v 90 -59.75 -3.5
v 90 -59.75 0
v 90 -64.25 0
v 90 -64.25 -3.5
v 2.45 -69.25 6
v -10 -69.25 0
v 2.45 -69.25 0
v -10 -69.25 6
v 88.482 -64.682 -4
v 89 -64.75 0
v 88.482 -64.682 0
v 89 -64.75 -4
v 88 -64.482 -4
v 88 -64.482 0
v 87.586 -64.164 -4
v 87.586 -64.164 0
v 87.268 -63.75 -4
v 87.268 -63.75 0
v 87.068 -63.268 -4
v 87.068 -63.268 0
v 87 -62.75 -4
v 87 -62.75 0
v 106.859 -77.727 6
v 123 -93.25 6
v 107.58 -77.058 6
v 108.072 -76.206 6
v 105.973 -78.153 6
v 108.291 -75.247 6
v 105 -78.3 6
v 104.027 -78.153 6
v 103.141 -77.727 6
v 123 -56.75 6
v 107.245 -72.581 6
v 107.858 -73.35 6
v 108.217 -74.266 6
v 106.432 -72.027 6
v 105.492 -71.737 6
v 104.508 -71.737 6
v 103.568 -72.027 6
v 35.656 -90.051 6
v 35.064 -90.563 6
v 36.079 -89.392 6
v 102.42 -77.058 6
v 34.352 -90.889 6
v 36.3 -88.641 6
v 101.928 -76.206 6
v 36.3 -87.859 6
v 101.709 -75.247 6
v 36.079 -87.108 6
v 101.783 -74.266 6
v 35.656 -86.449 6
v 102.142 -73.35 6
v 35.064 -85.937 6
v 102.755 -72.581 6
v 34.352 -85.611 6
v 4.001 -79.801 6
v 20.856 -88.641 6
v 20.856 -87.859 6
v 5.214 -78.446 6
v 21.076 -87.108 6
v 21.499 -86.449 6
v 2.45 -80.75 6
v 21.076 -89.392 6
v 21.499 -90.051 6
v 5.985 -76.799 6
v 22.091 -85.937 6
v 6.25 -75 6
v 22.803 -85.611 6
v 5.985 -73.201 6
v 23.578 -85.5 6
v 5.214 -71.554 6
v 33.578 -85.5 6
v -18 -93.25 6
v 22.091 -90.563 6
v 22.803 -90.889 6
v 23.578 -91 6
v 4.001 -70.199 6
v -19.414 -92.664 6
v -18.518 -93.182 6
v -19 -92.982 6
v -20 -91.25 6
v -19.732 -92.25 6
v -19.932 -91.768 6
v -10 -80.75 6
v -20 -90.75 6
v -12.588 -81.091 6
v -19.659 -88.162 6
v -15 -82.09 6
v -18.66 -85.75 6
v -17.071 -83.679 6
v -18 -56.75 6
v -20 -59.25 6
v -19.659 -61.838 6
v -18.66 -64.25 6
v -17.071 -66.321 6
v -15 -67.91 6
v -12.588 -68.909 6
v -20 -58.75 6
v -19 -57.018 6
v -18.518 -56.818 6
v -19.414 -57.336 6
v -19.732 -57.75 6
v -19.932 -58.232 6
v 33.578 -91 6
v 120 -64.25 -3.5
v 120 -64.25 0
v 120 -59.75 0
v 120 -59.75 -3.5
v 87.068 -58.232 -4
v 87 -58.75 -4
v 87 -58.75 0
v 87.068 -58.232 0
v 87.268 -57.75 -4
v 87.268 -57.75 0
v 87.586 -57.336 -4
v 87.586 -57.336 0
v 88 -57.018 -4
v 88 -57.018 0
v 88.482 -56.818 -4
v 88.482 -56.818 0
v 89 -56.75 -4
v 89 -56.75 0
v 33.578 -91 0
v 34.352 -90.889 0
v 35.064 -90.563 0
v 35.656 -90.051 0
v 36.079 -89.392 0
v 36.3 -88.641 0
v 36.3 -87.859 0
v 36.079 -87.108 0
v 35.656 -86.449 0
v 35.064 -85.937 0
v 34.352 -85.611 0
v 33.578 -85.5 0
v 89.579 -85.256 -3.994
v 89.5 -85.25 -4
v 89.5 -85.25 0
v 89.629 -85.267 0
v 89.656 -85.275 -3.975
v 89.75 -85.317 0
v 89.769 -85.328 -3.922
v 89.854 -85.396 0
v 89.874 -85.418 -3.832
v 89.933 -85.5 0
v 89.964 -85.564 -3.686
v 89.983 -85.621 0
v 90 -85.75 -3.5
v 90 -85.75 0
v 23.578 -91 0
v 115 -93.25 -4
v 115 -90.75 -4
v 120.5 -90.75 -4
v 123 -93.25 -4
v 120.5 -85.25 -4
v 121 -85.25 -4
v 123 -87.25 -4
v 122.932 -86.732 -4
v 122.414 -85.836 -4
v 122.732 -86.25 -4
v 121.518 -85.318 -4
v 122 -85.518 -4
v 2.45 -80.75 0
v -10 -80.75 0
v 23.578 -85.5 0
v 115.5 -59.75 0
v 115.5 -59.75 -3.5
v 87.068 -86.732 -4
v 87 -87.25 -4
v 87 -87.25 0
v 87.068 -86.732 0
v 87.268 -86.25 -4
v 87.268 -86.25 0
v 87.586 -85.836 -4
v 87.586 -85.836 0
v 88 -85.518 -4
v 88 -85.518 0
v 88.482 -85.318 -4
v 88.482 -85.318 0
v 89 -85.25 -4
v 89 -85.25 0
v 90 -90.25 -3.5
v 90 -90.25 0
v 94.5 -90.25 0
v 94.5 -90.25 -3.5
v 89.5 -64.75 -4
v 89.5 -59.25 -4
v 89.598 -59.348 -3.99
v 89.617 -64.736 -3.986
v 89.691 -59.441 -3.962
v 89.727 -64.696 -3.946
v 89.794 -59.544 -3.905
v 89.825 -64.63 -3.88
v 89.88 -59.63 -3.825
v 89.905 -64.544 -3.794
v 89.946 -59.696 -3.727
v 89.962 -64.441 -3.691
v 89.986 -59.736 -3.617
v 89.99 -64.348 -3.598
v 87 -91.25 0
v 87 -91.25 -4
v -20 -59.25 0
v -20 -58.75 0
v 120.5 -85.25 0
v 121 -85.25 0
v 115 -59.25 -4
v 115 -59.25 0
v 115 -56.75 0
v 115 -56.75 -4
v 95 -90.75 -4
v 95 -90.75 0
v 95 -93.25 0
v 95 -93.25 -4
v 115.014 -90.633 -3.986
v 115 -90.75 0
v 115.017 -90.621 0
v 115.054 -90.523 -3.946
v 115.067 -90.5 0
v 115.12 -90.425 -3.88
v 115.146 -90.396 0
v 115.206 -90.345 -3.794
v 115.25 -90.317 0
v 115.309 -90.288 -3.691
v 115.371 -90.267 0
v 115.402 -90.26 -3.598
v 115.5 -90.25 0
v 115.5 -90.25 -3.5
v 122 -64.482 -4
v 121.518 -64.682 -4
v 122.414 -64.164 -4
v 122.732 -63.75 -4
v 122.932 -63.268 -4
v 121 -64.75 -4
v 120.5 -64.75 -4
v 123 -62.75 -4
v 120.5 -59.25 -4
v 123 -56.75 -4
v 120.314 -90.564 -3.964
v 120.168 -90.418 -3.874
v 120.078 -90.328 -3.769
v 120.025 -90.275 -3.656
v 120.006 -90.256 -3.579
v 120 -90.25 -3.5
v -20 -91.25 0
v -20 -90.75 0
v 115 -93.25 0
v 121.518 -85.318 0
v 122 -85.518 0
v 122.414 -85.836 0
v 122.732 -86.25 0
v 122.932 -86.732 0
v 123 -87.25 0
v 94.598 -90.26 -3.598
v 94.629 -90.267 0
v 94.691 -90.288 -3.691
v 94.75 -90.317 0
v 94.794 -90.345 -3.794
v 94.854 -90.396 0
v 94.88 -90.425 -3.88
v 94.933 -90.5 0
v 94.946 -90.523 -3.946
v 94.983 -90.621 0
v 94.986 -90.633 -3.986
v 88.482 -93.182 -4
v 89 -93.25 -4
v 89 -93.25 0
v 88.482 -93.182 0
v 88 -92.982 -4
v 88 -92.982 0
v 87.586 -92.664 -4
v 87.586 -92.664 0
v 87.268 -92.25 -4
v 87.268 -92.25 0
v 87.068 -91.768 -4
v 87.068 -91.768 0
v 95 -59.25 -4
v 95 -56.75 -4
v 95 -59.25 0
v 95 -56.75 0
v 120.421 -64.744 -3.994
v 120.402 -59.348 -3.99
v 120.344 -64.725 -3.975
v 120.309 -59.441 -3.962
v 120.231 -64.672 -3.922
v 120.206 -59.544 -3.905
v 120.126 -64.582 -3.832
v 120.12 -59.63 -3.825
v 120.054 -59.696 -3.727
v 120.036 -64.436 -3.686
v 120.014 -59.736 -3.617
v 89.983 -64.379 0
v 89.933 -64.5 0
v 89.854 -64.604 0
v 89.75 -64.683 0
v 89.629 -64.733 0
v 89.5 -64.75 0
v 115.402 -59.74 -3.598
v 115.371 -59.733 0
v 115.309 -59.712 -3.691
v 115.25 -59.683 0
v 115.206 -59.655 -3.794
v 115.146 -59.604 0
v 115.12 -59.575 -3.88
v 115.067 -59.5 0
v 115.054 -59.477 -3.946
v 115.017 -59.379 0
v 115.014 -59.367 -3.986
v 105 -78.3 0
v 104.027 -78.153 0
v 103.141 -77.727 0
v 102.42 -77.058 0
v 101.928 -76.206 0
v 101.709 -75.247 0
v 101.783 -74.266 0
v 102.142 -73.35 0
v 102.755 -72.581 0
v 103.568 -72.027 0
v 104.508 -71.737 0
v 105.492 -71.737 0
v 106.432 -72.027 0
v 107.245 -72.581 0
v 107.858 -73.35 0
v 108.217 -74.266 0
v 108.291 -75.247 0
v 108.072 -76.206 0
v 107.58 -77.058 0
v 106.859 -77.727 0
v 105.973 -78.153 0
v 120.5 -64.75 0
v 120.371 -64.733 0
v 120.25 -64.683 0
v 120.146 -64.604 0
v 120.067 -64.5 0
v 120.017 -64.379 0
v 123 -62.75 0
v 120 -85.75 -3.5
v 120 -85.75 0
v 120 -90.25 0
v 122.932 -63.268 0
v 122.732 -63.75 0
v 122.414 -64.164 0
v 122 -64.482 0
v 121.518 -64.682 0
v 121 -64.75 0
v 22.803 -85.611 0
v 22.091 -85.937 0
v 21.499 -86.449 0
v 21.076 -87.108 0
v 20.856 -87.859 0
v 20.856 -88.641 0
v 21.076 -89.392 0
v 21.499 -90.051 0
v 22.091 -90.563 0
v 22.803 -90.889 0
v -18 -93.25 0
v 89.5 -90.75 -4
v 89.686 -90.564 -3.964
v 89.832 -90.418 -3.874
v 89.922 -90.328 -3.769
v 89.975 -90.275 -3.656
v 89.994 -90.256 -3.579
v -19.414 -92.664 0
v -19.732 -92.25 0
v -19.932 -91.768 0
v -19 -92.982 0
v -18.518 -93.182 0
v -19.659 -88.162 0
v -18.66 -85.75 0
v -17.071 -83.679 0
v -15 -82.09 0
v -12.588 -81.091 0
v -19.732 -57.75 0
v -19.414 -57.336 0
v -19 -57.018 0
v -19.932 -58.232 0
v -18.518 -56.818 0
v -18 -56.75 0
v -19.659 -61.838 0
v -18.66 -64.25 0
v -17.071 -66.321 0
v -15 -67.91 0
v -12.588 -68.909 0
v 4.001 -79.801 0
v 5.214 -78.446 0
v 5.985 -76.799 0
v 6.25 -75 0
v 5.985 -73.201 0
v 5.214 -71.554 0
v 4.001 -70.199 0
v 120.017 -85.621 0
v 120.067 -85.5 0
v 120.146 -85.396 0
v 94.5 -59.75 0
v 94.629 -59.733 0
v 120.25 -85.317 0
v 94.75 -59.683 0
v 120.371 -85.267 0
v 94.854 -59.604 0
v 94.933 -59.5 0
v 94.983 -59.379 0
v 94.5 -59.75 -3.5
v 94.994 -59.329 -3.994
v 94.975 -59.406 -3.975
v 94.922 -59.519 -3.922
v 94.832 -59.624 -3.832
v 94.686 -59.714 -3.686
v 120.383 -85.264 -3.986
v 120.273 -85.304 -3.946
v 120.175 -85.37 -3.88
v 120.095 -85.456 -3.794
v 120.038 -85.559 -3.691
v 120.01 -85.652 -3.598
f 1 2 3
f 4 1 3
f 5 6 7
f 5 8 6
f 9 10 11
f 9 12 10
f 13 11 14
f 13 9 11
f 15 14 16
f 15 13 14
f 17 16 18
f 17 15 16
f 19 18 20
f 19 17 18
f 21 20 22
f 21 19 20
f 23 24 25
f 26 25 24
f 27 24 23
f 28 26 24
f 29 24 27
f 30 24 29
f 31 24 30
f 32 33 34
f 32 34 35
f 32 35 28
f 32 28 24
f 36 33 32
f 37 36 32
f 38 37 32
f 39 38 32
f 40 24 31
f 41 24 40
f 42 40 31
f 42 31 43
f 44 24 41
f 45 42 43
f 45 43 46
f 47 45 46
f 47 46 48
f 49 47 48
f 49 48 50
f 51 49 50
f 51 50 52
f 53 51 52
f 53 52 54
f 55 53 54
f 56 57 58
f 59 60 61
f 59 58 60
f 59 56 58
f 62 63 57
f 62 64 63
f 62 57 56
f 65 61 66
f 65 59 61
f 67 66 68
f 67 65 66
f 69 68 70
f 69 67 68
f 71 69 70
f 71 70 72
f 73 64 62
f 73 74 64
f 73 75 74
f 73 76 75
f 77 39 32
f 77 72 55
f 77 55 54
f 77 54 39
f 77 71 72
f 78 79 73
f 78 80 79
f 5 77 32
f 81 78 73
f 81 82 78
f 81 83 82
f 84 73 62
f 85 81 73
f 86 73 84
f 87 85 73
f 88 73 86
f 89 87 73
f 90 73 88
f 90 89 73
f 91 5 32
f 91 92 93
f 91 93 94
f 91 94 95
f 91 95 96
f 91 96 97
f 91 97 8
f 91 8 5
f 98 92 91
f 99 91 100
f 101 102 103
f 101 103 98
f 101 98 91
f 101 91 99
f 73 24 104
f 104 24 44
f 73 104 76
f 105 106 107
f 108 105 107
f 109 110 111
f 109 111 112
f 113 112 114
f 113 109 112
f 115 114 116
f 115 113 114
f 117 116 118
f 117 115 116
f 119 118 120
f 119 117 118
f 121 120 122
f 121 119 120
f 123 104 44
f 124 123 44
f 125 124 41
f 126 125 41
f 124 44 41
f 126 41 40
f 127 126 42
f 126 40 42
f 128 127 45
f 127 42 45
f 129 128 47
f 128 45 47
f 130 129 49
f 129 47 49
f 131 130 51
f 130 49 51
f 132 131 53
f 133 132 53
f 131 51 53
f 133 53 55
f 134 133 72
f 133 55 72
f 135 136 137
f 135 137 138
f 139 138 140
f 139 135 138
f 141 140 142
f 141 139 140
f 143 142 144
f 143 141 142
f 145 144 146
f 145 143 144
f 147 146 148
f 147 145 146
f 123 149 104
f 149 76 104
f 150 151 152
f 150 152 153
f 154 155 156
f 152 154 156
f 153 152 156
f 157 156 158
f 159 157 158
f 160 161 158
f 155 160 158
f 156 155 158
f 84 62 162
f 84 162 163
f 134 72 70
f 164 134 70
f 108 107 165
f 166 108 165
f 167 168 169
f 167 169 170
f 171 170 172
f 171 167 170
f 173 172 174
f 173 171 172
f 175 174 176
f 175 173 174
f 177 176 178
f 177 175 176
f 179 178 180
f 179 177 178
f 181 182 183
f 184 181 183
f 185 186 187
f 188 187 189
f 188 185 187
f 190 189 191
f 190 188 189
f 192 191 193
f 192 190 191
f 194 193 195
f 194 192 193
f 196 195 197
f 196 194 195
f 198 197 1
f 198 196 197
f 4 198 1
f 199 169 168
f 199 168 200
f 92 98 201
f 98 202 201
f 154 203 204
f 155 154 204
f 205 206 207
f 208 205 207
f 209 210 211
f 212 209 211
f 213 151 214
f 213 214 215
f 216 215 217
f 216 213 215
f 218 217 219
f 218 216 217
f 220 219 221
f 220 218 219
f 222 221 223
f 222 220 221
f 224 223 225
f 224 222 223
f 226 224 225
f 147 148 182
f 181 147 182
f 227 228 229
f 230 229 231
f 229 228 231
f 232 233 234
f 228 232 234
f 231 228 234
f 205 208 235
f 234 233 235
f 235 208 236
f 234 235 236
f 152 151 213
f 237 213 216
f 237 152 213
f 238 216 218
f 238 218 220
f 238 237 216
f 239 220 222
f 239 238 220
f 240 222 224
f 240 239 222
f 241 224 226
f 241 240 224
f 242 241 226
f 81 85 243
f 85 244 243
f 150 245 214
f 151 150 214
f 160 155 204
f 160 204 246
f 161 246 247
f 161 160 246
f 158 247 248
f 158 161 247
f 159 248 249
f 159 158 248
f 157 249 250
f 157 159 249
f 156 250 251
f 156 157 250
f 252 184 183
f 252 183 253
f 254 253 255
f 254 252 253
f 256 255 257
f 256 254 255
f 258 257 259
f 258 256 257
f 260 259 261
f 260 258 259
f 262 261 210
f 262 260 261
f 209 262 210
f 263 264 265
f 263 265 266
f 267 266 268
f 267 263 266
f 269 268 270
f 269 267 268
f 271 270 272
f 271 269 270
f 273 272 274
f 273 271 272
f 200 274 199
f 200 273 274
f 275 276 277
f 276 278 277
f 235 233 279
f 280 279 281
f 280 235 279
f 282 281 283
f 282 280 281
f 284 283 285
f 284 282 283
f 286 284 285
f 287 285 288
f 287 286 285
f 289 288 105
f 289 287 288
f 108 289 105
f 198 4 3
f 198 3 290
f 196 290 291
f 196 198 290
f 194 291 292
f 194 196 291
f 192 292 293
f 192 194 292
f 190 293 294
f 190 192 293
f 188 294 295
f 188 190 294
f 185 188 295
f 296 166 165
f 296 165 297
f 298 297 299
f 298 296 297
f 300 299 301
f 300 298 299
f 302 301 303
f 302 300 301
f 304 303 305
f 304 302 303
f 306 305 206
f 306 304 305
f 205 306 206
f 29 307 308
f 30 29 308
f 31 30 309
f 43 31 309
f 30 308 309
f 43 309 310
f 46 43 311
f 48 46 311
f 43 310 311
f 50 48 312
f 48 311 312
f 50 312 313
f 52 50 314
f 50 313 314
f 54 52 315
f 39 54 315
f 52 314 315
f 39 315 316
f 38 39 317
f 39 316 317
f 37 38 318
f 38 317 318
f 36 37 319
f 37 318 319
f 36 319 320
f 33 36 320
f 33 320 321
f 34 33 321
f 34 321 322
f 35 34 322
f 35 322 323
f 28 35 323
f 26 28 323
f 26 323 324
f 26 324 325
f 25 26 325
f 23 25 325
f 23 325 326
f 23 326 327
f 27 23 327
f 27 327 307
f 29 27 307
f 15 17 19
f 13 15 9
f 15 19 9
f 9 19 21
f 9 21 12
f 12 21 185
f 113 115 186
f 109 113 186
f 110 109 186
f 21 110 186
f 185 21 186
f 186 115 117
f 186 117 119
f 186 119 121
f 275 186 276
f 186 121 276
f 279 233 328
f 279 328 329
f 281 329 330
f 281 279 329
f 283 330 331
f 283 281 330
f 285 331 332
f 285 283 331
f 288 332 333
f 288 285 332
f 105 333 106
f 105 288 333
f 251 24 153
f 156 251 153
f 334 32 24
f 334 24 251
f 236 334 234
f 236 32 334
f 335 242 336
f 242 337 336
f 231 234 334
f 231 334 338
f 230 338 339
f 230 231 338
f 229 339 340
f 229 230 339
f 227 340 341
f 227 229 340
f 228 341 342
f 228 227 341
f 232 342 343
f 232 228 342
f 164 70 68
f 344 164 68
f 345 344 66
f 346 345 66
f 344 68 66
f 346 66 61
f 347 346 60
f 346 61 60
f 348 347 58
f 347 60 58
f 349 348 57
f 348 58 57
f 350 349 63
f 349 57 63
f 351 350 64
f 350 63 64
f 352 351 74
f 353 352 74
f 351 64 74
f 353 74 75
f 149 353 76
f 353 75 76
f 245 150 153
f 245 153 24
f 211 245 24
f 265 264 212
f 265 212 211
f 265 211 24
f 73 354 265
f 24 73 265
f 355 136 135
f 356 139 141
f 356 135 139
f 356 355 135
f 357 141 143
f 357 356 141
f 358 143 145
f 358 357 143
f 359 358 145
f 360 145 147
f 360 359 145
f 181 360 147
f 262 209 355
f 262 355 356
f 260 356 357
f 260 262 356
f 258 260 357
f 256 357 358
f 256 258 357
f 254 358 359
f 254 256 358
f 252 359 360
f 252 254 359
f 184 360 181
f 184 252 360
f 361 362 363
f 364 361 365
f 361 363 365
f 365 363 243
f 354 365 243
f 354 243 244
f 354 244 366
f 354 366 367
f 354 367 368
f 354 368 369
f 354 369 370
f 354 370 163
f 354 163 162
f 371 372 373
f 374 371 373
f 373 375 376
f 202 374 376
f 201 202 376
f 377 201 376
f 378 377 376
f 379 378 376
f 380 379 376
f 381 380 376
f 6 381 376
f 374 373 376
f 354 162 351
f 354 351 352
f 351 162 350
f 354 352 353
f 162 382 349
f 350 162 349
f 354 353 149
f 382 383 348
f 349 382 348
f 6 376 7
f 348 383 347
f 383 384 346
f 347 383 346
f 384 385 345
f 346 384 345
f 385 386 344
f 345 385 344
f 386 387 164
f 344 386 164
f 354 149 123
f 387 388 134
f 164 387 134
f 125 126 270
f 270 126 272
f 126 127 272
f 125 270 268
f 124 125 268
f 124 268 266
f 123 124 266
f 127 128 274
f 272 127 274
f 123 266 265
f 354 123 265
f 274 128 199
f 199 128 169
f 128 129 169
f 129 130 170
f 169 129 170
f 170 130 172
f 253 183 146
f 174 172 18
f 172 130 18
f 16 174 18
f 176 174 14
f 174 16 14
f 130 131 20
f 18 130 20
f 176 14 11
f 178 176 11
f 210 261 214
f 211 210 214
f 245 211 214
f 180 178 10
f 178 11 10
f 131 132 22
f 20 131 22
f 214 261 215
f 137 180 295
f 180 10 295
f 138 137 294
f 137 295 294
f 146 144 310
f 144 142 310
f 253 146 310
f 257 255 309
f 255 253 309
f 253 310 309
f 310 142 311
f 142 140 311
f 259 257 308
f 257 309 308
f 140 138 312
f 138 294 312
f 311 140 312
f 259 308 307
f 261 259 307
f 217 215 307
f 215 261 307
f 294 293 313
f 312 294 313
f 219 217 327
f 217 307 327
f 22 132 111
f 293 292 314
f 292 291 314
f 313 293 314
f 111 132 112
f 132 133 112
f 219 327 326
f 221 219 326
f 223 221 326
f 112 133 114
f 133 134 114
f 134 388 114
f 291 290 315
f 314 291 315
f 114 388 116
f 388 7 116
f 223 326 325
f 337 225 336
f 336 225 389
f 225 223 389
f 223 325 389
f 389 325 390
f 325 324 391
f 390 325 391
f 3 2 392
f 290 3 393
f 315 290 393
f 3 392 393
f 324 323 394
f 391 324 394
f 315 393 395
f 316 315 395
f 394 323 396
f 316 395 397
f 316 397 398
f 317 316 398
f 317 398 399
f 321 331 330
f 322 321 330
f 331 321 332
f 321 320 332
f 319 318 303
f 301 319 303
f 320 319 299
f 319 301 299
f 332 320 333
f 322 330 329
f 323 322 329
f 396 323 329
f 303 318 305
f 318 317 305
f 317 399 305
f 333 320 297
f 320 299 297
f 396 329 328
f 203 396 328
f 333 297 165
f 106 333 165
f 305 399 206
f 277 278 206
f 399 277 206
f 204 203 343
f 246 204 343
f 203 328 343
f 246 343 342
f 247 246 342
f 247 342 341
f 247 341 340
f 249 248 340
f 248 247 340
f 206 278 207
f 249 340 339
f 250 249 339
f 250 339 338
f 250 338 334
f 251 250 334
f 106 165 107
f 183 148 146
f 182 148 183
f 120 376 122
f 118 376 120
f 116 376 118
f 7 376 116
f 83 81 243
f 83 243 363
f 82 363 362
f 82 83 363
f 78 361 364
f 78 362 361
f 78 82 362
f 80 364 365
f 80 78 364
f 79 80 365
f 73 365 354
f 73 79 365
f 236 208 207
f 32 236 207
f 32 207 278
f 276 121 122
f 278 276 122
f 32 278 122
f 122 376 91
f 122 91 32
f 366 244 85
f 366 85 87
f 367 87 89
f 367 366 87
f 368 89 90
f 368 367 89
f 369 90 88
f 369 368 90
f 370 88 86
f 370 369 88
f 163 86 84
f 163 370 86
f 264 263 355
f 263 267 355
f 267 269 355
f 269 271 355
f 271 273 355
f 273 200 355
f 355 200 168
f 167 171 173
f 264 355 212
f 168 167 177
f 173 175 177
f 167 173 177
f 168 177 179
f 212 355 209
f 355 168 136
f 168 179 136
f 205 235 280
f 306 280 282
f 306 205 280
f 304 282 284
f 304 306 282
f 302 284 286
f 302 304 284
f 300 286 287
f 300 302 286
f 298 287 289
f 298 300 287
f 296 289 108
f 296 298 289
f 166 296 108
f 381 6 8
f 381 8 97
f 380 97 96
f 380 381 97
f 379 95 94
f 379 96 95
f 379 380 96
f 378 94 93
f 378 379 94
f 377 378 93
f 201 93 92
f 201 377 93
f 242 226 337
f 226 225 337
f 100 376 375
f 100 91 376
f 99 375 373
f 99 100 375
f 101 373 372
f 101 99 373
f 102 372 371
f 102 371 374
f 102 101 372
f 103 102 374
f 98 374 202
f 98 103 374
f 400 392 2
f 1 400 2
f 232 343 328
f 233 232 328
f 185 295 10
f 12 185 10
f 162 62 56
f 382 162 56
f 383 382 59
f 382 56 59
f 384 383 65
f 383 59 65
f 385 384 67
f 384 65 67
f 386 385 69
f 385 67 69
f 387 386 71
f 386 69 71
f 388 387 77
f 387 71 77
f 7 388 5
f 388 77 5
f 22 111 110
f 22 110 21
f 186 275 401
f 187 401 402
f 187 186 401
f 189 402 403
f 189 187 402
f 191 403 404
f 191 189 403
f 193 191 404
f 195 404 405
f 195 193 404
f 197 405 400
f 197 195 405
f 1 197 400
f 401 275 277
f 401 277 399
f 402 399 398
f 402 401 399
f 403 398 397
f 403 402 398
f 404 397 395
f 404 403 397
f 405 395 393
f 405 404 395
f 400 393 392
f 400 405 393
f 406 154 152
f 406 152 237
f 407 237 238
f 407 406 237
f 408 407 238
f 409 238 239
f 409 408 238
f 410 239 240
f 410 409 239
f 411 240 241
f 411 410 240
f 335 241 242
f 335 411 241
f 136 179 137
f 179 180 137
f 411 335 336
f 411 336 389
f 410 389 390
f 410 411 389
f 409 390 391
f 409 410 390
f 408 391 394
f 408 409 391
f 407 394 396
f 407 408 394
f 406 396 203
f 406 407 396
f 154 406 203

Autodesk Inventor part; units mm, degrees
ref_plane "YZ Plane" through (0, 0, 0) normal (1, 0, 0) x (0, 1, 0)
ref_plane "XZ Plane" through (0, 0, 0) normal (0, 1, 0) x (-1, 0, 0)
ref_plane "作業平面1" through (0, 0, 0) normal (0, 0, 1) x (1, 0, 0)
sketch "スケッチ2" plane through (0, 0, 0) normal (0, 0, 1) x (1, 0, 0)
  line L0 (120, -56.75) -> (-20, -56.75)
  line L1 (-20, -56.75) -> (-20, -93.25)
  line L2 (-20, -93.25) -> (120, -93.25)
  line L3 (120, -93.25) -> (120, -56.75)
  circle A0 centre (0, -75) radius 6 construction
  circle A1 centre (0, -75) radius 75 construction
  point P0 (0, 0)
  dimension "d1" = 150
  dimension "d2" = 18.25
  dimension "d3" = 18.25
  dimension "d4" = 20
  dimension "d29" = 120
extrude "押し出し1" add sketch "スケッチ2" along normal blind 6
sketch "スケッチ3" plane through (0, 0, 6) normal (0, 0, 1) x (1, 0, 0)
  circle A0 centre (0, -75) radius 6 construction
  circle A1 centre (0, -75) radius 6.25
  line L0 (0, -68.75) -> (-38.1, -68.75) construction
  line L1 (-38.1, -68.75) -> (-38.1, -81.25) construction
  line L2 (-38.1, -81.25) -> (0, -81.25) construction
  line L3 (0, -81.25) -> (0, -68.75) construction
  line L4 (-20, -68) -> (-20, -81.25)
  line L5 (0, -82) -> (0, -68.75)
  line L6 (-20, -56.75) -> (-20, -93.25) projected
  line L7 (-20, -69.25) -> (2.4495, -69.25)
  line L8 (2.4495, -69.25) -> (2.4495, -80.75)
  line L9 (2.4495, -80.75) -> (-20, -80.75)
  line L10 (-20, -80.75) -> (-20, -69.25)
  point P0 (0, 0)
  point P1 (-2.4495, -80.75)
  point P2 (-2.4495, -69.25)
  point P3 (0, -80.75)
  point P4 (0, -69.25)
  point P5 (0, -81.25)
  dimension "d8" = 12.5
  dimension "d30" = 11.5
extrude "押し出し2" cut sketch "スケッチ3" against normal blind 12.5 contours A1 L8 | L8 L9 L5 L7 | L5 L9 A1 L7 | A1 L9 L4 L7
fillet "フィレット1" radius 10 2 edges at (-20, -80.75, 3) (-20, -69.25, 3)
ref_plane "作業平面2" through (-20, -75, 0) normal (0, -1, 0) x (1, 0, 0)
sketch "スケッチ4" plane through (0, 0, 6) normal (0, 0, 1) x (1, 0, 0)
  line L0 (-20, -93.25) -> (120, -93.25) projected
  line L1 (120, -56.75) -> (-20, -56.75) projected
  line L2 (120, -93.25) -> (120, -56.75) projected
  point P0 (0, 0)
  point P1 (105, -75)
  dimension "d25" = 15
  dimension "d26" = 36.5
  dimension "d27" = 18.25
hole "穴1" at (105, -75, 6) direction (0, 0, -1) diameter 6.6 end through all
ref_plane "作業平面3" through (0, -75, 0) normal (0, 0.7071, 0.7071) x (-1, 0, 0)
sketch "スケッチ5" plane through (0, 0, 0) normal (0, 0, 1) x (1, 0, 0)
  circle A0 centre (105, -75) radius 3.3 construction
  arc A1 (-20, -59.25) -> (-10, -69.25) centre (-10, -59.25) ccw construction
  line L0 (-10, -69.25) -> (2.4495, -69.25) construction
  arc A2 (2.4495, -80.75) -> (2.4495, -69.25) centre (0, -75) ccw construction
  line L1 (2.4495, -80.75) -> (-10, -80.75) construction
  arc A3 (-10, -80.75) -> (-20, -90.75) centre (-10, -90.75) ccw construction
  line L2 (-20, -90.75) -> (-20, -93.25) construction
  line L3 (-20, -93.25) -> (120, -93.25) construction
  line L4 (120, -93.25) -> (120, -56.75) construction
  line L5 (120, -56.75) -> (-20, -56.75) construction
  line L6 (-20, -56.75) -> (-20, -59.25) construction
  line L7 (123, -56.75) -> (87, -56.75)
  line L8 (87, -56.75) -> (87, -93.25)
  line L9 (87, -93.25) -> (123, -93.25)
  line L10 (123, -93.25) -> (123, -56.75)
  line L11 (120, -93.25) -> (120, -56.75) projected
  line L12 (90, -90.25) -> (120, -90.25)
  line L13 (120, -90.25) -> (120, -59.75)
  line L14 (120, -59.75) -> (90, -59.75)
  line L15 (90, -59.75) -> (90, -90.25)
  line L16 (90, -90.25) -> (120, -59.75) construction
  line L17 (120, -90.25) -> (90, -59.75) construction
  line L18 (87, -85.25) -> (123, -85.25)
  line L19 (123, -85.25) -> (123, -64.75)
  line L20 (123, -64.75) -> (87, -64.75)
  line L21 (87, -64.75) -> (87, -85.25)
  circle A4 centre (105, -75) radius 3.3 projected
  line L22 (87, -85.25) -> (123, -64.75) construction
  line L23 (123, -85.25) -> (87, -64.75) construction
  line L24 (95, -93.25) -> (115, -93.25)
  line L25 (115, -93.25) -> (115, -56.75)
  line L26 (115, -56.75) -> (95, -56.75)
  line L27 (95, -56.75) -> (95, -93.25)
  line L28 (95, -93.25) -> (115, -56.75) construction
  line L29 (115, -93.25) -> (95, -56.75) construction
  point P0 (0, 0)
  point P1 (95, -93.25)
  point P2 (95, -90.25)
  point P3 (90, -85.25)
  point P4 (95, -59.75)
  point P5 (90, -64.75)
  point P6 (120, -85.25)
  point P7 (115, -90.25)
  point P8 (115, -93.25)
  point P9 (115, -59.75)
  point P10 (120, -64.75)
  dimension "d31" = 3
  dimension "d34" = 30.5
  dimension "d35" = 3
  dimension "d36" = 3
  dimension "d37" = 3
  dimension "d38" = 8
  dimension "d39" = 8
extrude "押し出し3" add sketch "スケッチ5" against normal blind 4 contours L10 L20 L11 L7 | L11 L14 L25 L7 | L10 L9 L11 L18 | L27 L14 L15 L20 L8 L7 | L9 L25 L12 L11 | L18 L15 L12 L27 L9 L8
sketch "スケッチ6" plane through (120, -93.25, 0) normal (1, 0, 0) x (0, 0, -1)
  line L0 (0, 8) -> (0, 28.5) projected
  line L1 (0, 36.5) -> (-6, 36.5) projected
  line L2 (-6, 0) -> (-6, 36.5) projected
  line L3 (0, 0) -> (-6, 0) projected
  line L4 (0, 0) -> (0, 3) projected
  line L5 (0, 3) -> (0, 8) projected
  line L6 (0, 28.5) -> (0, 33.5) projected
  line L7 (0, 33.5) -> (0, 36.5) projected
  point P0 (0, 93.25)
extrude "押し出し4" add sketch "スケッチ6" along normal up to surface (3 mm away)
fillet "フィレット2" radius 2 8 edges at (-20, -56.75, 3) (-20, -93.25, 3) (87, -56.75, -2) (87, -93.25, -2) (87, -64.75, -2) (87, -85.25, -2) (123, -64.75, -2) (123, -85.25, -2)
fillet "フィレット2" radius 0.5 16 edges at (115, -59.75, -2) (120, -64.75, -2) (120, -85.25, -2) (115, -90.25, -2) (95, -59.75, -2) (90, -64.75, -2) (90, -62.25, -4) (92.5, -59.75, -4) (117.5, -59.75, -4) (120, -62.25, -4) (120, -87.75, -4) (117.5, -90.25, -4) (95, -90.25, -2) (90, -85.25, -2) (90, -87.75, -4) (92.5, -90.25, -4)
sketch "スケッチ7" plane through (20.6125, 13, 6) normal (0, 0, 1) x (1, 0, 0)
  arc A0 (3.9922, -80.75) -> (-0.2106, -72.4528) centre (-20.6125, -88) ccw
  circle A1 centre (-20.6125, -88) radius 31.5 construction
  circle A2 centre (7.9653, -101.25) radius 2.75 construction
  line L0 (-18, -106.25) -> (105, -106.25) construction
  arc A3 (-18.163, -93.75) -> (-18.163, -82.25) centre (-20.6125, -88) ccw projected
  line L1 (-38.6125, -106.25) -> (100.3875, -106.25) projected
  point P0 (0, 0)
  dimension "d48" = 63
  dimension "d46" = 5.5
  dimension "d47" = 5
hole "穴2" at (28.5777, -88.25, 6) direction (0, 0, -1) diameter 5.5 end through all
sketch "スケッチ8" plane through (0, 0, 6) normal (0, 0, 1) x (1, 0, 0)
  circle A0 centre (28.5777, -88.25) radius 2.75 construction
  arc A1 (121, -93.25) -> (123, -91.25) centre (121, -91.25) ccw construction
  line L0 (123, -91.25) -> (123, -58.75) construction
  arc A2 (123, -58.75) -> (121, -56.75) centre (121, -58.75) ccw construction
  line L1 (-18, -56.75) -> (121, -56.75) construction
  arc A3 (-18, -56.75) -> (-20, -58.75) centre (-18, -58.75) ccw construction
  line L2 (-20, -58.75) -> (-20, -59.25) construction
  arc A4 (-20, -59.25) -> (-10, -69.25) centre (-10, -59.25) ccw construction
  line L3 (-10, -69.25) -> (2.4495, -69.25) construction
  arc A5 (2.4495, -80.75) -> (2.4495, -69.25) centre (0, -75) ccw construction
  line L4 (2.4495, -80.75) -> (-10, -80.75) construction
  arc A6 (-10, -80.75) -> (-20, -90.75) centre (-10, -90.75) ccw construction
  line L5 (-20, -90.75) -> (-20, -91.25) construction
  arc A7 (-20, -91.25) -> (-18, -93.25) centre (-18, -91.25) ccw construction
  line L6 (-18, -93.25) -> (121, -93.25) construction
  circle A8 centre (105, -75) radius 3.3 construction
  line L7 (23.5777, -91) -> (33.5777, -91)
  line L8 (33.5777, -91) -> (33.5777, -85.5) construction
  line L9 (33.5777, -85.5) -> (23.5777, -85.5)
  line L10 (23.5777, -85.5) -> (23.5777, -91) construction
  circle A9 centre (28.5777, -88.25) radius 2.75 projected
  line L11 (23.5777, -91) -> (33.5777, -85.5) construction
  line L12 (33.5777, -91) -> (23.5777, -85.5) construction
  arc A10 (33.5777, -91) -> (33.5777, -85.5) centre (33.5777, -88.25) ccw
  arc A11 (23.5777, -85.5) -> (23.5777, -91) centre (23.5777, -88.25) ccw
  point P0 (0, 0)
  dimension "d55" = 10
extrude "押し出し5" cut sketch "スケッチ8" against normal through all
equation "\"d3\" = d2"
equation "\"d9\" = d8"
equation "\"d27\" = 0.5 * d26"
equation "\"d35\" = d31"
equation "\"d36\" = d31"
equation "\"d37\" = d31"
equation "\"d39\" = d38"
properties part number "wheel_mount._brake_01ipt" material "アルミニウム 6061"
